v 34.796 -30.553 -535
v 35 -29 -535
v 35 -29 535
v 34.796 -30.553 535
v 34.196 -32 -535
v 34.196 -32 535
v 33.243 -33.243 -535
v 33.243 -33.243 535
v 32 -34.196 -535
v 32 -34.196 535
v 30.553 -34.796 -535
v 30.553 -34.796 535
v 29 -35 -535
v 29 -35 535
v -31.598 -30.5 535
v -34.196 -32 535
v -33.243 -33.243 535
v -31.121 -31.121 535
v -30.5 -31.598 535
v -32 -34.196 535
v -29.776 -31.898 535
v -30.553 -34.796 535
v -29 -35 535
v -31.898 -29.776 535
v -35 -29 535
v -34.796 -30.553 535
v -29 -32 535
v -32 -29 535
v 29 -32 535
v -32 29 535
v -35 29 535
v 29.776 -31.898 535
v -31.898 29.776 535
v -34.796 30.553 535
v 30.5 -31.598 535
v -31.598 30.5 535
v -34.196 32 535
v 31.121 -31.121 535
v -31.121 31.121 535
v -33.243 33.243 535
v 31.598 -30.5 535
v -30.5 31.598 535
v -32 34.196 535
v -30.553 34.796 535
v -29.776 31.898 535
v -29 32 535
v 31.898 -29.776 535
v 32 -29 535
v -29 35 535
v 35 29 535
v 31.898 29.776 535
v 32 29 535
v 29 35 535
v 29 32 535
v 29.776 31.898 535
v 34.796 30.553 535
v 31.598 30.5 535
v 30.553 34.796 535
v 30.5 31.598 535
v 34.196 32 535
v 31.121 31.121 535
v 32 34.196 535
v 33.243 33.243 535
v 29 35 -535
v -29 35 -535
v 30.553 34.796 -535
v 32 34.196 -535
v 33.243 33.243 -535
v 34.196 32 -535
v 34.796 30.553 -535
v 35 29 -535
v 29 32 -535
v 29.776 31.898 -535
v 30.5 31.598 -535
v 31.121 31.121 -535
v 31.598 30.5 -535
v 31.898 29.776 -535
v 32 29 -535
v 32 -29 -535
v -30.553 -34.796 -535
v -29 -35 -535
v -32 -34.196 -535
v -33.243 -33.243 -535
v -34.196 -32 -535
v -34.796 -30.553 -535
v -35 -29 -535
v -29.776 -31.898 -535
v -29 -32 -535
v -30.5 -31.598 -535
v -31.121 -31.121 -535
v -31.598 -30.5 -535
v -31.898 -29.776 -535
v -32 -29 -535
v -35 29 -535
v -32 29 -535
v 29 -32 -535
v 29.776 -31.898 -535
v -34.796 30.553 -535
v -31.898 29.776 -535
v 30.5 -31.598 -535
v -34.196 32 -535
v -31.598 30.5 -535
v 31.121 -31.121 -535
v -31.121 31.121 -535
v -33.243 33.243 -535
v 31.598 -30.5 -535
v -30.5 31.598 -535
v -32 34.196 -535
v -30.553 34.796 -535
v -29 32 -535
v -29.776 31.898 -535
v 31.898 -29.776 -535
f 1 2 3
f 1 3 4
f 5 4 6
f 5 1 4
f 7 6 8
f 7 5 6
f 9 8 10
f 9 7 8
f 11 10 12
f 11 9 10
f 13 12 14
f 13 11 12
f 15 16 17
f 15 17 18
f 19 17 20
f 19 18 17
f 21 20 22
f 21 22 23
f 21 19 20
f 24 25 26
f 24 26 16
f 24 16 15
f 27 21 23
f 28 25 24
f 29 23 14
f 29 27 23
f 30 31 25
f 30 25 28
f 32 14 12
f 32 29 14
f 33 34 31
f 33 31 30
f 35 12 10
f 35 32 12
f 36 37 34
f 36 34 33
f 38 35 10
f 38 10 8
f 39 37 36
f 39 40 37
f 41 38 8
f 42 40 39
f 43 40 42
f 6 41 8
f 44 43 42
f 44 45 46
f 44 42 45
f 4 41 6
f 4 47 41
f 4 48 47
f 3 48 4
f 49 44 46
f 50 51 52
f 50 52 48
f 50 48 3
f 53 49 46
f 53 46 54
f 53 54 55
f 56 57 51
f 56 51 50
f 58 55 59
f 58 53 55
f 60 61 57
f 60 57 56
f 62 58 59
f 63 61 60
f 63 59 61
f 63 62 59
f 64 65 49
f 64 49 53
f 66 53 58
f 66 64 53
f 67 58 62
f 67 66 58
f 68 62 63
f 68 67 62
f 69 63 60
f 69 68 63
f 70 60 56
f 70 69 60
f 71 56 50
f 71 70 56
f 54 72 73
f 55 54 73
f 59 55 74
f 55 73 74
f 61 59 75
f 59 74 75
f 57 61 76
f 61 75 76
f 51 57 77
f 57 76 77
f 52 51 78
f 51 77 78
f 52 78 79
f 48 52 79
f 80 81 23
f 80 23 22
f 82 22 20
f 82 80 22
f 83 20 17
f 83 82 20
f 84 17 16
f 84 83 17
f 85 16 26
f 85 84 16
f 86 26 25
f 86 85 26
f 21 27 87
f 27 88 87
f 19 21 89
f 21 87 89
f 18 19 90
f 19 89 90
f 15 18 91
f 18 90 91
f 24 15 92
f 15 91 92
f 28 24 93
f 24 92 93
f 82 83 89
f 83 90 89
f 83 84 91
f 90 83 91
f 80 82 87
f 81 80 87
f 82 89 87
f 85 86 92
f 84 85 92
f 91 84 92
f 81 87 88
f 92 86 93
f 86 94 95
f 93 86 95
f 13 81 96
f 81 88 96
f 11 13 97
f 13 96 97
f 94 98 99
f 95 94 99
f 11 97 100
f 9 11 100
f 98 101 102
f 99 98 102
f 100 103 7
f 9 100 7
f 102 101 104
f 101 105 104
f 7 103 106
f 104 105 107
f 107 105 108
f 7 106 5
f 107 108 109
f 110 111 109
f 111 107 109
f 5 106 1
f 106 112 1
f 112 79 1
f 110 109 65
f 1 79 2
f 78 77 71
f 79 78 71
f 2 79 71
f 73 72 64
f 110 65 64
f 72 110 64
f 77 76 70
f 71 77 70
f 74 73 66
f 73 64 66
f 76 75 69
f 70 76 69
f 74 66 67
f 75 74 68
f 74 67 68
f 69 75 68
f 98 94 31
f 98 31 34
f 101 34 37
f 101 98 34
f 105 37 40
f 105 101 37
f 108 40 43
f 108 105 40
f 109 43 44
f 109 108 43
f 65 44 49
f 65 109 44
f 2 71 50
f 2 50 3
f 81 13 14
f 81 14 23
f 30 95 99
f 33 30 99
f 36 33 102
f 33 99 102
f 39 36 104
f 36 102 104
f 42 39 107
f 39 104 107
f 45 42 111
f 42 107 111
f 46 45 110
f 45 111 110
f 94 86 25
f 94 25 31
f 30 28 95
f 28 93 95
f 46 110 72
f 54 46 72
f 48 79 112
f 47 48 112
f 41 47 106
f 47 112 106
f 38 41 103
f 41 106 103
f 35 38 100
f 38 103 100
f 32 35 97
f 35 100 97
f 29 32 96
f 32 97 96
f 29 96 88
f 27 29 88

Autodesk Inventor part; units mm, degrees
ref_plane "Plano inicial" through (0, 0, -535) normal (0, 0, 1) x (1, 0, 0)
ref_plane "Plano final" through (0, 0, 535) normal (0, 0, 1) x (1, 0, 0)
sketch "Boceto" plane through (0, 0, 0) normal (0, 0, 1) x (1, 0, 0)
  line L0 (-35, -29) -> (-35, 29)
  line L1 (-29, 35) -> (29, 35)
  line L2 (35, 29) -> (35, -29)
  line L3 (29, -35) -> (-29, -35)
  arc A0 (-35, -29) -> (-29, -35) centre (-29, -29) ccw
  arc A1 (35, 29) -> (29, 35) centre (29, 29) ccw
  arc A2 (-29, 35) -> (-35, 29) centre (-29, 29) ccw
  arc A3 (29, -35) -> (35, -29) centre (29, -29) ccw
  arc A4 (-29, 32) -> (-32, 29) centre (-29, 29) ccw
  line L4 (-29, 32) -> (29, 32)
  arc A5 (32, 29) -> (29, 32) centre (29, 29) ccw
  line L5 (32, 29) -> (32, -29)
  arc A6 (29, -32) -> (32, -29) centre (29, -29) ccw
  line L6 (29, -32) -> (-29, -32)
  arc A7 (-32, -29) -> (-29, -32) centre (-29, -29) ccw
  line L7 (-32, -29) -> (-32, 29)
  line L8 (0, 50.7397) -> (0, -50.7397) construction
  line L9 (-50.7397, 0) -> (50.7397, 0) construction
  dimension "d7" = 6
  dimension "d9" = 70
  dimension "d11" = 70
  dimension "d12" = 3
  dimension "d15" = 35
  dimension "d16" = 35
extrude "Cuerpo" add sketch "Boceto" along normal up to surface (1070 mm away) from surface at -535
sketch "Sketch3" plane through (0, 0, 0) normal (0, 0, 1) x (1, 0, 0)
  line L0 (0, 0) -> (10, 0)
ref_plane "Work Plane3" through (0, 0, 0) normal (0, -1, 0) x (1, 0, 0)
sketch "Sketch4" plane through (0, 0, 0) normal (0, -1, 0) x (1, 0, 0)
  line L0 (-2, -535) -> (12, -535)
  line L1 (-2, 535) -> (12, 535)
  dimension "d18" = 1070
ref_plane "Plano de trabajo4" through (2315, -29, -535) normal (0, 0, -1) x (-1, 0, 0)
split "Dividir1" plane through (2315, -29, -535) removes the side toward (0, 0, -1)
ref_plane "Plano de trabajo5" through (0, -29, 535) normal (0, 0, 1) x (1, 0, 0)
split "Dividir2" plane through (0, -29, 535) removes the side toward (0, 0, 1)
equation "\"d7\" = G_IR"
equation "\"d9\" = G_W"
equation "\"d11\" = G_H"
equation "\"d12\" = G_T"
equation "\"d15\" = 0.5 * d9"
equation "\"d16\" = 0.5 * d11"
equation "\"d3\" = G_L"
equation "\"G_W\" = 70"
equation "\"G_H\" = 70"
equation "\"G_T\" = 3"
equation "\"G_IR\" = 6"
equation "\"G_L\" = d18"
equation "\"G_OFFSET_START\" = 535"
equation "\"G_OFFSET_END\" = 35"
equation "\"d13\" = -G_OFFSET_START"
equation "\"d14\" = G_OFFSET_END + B_L"
equation "\"B_L\" = 500"
properties part number "ISO 10799-2 - 70x70x3 - 1070" material "Galvanizado catalogo 2"
